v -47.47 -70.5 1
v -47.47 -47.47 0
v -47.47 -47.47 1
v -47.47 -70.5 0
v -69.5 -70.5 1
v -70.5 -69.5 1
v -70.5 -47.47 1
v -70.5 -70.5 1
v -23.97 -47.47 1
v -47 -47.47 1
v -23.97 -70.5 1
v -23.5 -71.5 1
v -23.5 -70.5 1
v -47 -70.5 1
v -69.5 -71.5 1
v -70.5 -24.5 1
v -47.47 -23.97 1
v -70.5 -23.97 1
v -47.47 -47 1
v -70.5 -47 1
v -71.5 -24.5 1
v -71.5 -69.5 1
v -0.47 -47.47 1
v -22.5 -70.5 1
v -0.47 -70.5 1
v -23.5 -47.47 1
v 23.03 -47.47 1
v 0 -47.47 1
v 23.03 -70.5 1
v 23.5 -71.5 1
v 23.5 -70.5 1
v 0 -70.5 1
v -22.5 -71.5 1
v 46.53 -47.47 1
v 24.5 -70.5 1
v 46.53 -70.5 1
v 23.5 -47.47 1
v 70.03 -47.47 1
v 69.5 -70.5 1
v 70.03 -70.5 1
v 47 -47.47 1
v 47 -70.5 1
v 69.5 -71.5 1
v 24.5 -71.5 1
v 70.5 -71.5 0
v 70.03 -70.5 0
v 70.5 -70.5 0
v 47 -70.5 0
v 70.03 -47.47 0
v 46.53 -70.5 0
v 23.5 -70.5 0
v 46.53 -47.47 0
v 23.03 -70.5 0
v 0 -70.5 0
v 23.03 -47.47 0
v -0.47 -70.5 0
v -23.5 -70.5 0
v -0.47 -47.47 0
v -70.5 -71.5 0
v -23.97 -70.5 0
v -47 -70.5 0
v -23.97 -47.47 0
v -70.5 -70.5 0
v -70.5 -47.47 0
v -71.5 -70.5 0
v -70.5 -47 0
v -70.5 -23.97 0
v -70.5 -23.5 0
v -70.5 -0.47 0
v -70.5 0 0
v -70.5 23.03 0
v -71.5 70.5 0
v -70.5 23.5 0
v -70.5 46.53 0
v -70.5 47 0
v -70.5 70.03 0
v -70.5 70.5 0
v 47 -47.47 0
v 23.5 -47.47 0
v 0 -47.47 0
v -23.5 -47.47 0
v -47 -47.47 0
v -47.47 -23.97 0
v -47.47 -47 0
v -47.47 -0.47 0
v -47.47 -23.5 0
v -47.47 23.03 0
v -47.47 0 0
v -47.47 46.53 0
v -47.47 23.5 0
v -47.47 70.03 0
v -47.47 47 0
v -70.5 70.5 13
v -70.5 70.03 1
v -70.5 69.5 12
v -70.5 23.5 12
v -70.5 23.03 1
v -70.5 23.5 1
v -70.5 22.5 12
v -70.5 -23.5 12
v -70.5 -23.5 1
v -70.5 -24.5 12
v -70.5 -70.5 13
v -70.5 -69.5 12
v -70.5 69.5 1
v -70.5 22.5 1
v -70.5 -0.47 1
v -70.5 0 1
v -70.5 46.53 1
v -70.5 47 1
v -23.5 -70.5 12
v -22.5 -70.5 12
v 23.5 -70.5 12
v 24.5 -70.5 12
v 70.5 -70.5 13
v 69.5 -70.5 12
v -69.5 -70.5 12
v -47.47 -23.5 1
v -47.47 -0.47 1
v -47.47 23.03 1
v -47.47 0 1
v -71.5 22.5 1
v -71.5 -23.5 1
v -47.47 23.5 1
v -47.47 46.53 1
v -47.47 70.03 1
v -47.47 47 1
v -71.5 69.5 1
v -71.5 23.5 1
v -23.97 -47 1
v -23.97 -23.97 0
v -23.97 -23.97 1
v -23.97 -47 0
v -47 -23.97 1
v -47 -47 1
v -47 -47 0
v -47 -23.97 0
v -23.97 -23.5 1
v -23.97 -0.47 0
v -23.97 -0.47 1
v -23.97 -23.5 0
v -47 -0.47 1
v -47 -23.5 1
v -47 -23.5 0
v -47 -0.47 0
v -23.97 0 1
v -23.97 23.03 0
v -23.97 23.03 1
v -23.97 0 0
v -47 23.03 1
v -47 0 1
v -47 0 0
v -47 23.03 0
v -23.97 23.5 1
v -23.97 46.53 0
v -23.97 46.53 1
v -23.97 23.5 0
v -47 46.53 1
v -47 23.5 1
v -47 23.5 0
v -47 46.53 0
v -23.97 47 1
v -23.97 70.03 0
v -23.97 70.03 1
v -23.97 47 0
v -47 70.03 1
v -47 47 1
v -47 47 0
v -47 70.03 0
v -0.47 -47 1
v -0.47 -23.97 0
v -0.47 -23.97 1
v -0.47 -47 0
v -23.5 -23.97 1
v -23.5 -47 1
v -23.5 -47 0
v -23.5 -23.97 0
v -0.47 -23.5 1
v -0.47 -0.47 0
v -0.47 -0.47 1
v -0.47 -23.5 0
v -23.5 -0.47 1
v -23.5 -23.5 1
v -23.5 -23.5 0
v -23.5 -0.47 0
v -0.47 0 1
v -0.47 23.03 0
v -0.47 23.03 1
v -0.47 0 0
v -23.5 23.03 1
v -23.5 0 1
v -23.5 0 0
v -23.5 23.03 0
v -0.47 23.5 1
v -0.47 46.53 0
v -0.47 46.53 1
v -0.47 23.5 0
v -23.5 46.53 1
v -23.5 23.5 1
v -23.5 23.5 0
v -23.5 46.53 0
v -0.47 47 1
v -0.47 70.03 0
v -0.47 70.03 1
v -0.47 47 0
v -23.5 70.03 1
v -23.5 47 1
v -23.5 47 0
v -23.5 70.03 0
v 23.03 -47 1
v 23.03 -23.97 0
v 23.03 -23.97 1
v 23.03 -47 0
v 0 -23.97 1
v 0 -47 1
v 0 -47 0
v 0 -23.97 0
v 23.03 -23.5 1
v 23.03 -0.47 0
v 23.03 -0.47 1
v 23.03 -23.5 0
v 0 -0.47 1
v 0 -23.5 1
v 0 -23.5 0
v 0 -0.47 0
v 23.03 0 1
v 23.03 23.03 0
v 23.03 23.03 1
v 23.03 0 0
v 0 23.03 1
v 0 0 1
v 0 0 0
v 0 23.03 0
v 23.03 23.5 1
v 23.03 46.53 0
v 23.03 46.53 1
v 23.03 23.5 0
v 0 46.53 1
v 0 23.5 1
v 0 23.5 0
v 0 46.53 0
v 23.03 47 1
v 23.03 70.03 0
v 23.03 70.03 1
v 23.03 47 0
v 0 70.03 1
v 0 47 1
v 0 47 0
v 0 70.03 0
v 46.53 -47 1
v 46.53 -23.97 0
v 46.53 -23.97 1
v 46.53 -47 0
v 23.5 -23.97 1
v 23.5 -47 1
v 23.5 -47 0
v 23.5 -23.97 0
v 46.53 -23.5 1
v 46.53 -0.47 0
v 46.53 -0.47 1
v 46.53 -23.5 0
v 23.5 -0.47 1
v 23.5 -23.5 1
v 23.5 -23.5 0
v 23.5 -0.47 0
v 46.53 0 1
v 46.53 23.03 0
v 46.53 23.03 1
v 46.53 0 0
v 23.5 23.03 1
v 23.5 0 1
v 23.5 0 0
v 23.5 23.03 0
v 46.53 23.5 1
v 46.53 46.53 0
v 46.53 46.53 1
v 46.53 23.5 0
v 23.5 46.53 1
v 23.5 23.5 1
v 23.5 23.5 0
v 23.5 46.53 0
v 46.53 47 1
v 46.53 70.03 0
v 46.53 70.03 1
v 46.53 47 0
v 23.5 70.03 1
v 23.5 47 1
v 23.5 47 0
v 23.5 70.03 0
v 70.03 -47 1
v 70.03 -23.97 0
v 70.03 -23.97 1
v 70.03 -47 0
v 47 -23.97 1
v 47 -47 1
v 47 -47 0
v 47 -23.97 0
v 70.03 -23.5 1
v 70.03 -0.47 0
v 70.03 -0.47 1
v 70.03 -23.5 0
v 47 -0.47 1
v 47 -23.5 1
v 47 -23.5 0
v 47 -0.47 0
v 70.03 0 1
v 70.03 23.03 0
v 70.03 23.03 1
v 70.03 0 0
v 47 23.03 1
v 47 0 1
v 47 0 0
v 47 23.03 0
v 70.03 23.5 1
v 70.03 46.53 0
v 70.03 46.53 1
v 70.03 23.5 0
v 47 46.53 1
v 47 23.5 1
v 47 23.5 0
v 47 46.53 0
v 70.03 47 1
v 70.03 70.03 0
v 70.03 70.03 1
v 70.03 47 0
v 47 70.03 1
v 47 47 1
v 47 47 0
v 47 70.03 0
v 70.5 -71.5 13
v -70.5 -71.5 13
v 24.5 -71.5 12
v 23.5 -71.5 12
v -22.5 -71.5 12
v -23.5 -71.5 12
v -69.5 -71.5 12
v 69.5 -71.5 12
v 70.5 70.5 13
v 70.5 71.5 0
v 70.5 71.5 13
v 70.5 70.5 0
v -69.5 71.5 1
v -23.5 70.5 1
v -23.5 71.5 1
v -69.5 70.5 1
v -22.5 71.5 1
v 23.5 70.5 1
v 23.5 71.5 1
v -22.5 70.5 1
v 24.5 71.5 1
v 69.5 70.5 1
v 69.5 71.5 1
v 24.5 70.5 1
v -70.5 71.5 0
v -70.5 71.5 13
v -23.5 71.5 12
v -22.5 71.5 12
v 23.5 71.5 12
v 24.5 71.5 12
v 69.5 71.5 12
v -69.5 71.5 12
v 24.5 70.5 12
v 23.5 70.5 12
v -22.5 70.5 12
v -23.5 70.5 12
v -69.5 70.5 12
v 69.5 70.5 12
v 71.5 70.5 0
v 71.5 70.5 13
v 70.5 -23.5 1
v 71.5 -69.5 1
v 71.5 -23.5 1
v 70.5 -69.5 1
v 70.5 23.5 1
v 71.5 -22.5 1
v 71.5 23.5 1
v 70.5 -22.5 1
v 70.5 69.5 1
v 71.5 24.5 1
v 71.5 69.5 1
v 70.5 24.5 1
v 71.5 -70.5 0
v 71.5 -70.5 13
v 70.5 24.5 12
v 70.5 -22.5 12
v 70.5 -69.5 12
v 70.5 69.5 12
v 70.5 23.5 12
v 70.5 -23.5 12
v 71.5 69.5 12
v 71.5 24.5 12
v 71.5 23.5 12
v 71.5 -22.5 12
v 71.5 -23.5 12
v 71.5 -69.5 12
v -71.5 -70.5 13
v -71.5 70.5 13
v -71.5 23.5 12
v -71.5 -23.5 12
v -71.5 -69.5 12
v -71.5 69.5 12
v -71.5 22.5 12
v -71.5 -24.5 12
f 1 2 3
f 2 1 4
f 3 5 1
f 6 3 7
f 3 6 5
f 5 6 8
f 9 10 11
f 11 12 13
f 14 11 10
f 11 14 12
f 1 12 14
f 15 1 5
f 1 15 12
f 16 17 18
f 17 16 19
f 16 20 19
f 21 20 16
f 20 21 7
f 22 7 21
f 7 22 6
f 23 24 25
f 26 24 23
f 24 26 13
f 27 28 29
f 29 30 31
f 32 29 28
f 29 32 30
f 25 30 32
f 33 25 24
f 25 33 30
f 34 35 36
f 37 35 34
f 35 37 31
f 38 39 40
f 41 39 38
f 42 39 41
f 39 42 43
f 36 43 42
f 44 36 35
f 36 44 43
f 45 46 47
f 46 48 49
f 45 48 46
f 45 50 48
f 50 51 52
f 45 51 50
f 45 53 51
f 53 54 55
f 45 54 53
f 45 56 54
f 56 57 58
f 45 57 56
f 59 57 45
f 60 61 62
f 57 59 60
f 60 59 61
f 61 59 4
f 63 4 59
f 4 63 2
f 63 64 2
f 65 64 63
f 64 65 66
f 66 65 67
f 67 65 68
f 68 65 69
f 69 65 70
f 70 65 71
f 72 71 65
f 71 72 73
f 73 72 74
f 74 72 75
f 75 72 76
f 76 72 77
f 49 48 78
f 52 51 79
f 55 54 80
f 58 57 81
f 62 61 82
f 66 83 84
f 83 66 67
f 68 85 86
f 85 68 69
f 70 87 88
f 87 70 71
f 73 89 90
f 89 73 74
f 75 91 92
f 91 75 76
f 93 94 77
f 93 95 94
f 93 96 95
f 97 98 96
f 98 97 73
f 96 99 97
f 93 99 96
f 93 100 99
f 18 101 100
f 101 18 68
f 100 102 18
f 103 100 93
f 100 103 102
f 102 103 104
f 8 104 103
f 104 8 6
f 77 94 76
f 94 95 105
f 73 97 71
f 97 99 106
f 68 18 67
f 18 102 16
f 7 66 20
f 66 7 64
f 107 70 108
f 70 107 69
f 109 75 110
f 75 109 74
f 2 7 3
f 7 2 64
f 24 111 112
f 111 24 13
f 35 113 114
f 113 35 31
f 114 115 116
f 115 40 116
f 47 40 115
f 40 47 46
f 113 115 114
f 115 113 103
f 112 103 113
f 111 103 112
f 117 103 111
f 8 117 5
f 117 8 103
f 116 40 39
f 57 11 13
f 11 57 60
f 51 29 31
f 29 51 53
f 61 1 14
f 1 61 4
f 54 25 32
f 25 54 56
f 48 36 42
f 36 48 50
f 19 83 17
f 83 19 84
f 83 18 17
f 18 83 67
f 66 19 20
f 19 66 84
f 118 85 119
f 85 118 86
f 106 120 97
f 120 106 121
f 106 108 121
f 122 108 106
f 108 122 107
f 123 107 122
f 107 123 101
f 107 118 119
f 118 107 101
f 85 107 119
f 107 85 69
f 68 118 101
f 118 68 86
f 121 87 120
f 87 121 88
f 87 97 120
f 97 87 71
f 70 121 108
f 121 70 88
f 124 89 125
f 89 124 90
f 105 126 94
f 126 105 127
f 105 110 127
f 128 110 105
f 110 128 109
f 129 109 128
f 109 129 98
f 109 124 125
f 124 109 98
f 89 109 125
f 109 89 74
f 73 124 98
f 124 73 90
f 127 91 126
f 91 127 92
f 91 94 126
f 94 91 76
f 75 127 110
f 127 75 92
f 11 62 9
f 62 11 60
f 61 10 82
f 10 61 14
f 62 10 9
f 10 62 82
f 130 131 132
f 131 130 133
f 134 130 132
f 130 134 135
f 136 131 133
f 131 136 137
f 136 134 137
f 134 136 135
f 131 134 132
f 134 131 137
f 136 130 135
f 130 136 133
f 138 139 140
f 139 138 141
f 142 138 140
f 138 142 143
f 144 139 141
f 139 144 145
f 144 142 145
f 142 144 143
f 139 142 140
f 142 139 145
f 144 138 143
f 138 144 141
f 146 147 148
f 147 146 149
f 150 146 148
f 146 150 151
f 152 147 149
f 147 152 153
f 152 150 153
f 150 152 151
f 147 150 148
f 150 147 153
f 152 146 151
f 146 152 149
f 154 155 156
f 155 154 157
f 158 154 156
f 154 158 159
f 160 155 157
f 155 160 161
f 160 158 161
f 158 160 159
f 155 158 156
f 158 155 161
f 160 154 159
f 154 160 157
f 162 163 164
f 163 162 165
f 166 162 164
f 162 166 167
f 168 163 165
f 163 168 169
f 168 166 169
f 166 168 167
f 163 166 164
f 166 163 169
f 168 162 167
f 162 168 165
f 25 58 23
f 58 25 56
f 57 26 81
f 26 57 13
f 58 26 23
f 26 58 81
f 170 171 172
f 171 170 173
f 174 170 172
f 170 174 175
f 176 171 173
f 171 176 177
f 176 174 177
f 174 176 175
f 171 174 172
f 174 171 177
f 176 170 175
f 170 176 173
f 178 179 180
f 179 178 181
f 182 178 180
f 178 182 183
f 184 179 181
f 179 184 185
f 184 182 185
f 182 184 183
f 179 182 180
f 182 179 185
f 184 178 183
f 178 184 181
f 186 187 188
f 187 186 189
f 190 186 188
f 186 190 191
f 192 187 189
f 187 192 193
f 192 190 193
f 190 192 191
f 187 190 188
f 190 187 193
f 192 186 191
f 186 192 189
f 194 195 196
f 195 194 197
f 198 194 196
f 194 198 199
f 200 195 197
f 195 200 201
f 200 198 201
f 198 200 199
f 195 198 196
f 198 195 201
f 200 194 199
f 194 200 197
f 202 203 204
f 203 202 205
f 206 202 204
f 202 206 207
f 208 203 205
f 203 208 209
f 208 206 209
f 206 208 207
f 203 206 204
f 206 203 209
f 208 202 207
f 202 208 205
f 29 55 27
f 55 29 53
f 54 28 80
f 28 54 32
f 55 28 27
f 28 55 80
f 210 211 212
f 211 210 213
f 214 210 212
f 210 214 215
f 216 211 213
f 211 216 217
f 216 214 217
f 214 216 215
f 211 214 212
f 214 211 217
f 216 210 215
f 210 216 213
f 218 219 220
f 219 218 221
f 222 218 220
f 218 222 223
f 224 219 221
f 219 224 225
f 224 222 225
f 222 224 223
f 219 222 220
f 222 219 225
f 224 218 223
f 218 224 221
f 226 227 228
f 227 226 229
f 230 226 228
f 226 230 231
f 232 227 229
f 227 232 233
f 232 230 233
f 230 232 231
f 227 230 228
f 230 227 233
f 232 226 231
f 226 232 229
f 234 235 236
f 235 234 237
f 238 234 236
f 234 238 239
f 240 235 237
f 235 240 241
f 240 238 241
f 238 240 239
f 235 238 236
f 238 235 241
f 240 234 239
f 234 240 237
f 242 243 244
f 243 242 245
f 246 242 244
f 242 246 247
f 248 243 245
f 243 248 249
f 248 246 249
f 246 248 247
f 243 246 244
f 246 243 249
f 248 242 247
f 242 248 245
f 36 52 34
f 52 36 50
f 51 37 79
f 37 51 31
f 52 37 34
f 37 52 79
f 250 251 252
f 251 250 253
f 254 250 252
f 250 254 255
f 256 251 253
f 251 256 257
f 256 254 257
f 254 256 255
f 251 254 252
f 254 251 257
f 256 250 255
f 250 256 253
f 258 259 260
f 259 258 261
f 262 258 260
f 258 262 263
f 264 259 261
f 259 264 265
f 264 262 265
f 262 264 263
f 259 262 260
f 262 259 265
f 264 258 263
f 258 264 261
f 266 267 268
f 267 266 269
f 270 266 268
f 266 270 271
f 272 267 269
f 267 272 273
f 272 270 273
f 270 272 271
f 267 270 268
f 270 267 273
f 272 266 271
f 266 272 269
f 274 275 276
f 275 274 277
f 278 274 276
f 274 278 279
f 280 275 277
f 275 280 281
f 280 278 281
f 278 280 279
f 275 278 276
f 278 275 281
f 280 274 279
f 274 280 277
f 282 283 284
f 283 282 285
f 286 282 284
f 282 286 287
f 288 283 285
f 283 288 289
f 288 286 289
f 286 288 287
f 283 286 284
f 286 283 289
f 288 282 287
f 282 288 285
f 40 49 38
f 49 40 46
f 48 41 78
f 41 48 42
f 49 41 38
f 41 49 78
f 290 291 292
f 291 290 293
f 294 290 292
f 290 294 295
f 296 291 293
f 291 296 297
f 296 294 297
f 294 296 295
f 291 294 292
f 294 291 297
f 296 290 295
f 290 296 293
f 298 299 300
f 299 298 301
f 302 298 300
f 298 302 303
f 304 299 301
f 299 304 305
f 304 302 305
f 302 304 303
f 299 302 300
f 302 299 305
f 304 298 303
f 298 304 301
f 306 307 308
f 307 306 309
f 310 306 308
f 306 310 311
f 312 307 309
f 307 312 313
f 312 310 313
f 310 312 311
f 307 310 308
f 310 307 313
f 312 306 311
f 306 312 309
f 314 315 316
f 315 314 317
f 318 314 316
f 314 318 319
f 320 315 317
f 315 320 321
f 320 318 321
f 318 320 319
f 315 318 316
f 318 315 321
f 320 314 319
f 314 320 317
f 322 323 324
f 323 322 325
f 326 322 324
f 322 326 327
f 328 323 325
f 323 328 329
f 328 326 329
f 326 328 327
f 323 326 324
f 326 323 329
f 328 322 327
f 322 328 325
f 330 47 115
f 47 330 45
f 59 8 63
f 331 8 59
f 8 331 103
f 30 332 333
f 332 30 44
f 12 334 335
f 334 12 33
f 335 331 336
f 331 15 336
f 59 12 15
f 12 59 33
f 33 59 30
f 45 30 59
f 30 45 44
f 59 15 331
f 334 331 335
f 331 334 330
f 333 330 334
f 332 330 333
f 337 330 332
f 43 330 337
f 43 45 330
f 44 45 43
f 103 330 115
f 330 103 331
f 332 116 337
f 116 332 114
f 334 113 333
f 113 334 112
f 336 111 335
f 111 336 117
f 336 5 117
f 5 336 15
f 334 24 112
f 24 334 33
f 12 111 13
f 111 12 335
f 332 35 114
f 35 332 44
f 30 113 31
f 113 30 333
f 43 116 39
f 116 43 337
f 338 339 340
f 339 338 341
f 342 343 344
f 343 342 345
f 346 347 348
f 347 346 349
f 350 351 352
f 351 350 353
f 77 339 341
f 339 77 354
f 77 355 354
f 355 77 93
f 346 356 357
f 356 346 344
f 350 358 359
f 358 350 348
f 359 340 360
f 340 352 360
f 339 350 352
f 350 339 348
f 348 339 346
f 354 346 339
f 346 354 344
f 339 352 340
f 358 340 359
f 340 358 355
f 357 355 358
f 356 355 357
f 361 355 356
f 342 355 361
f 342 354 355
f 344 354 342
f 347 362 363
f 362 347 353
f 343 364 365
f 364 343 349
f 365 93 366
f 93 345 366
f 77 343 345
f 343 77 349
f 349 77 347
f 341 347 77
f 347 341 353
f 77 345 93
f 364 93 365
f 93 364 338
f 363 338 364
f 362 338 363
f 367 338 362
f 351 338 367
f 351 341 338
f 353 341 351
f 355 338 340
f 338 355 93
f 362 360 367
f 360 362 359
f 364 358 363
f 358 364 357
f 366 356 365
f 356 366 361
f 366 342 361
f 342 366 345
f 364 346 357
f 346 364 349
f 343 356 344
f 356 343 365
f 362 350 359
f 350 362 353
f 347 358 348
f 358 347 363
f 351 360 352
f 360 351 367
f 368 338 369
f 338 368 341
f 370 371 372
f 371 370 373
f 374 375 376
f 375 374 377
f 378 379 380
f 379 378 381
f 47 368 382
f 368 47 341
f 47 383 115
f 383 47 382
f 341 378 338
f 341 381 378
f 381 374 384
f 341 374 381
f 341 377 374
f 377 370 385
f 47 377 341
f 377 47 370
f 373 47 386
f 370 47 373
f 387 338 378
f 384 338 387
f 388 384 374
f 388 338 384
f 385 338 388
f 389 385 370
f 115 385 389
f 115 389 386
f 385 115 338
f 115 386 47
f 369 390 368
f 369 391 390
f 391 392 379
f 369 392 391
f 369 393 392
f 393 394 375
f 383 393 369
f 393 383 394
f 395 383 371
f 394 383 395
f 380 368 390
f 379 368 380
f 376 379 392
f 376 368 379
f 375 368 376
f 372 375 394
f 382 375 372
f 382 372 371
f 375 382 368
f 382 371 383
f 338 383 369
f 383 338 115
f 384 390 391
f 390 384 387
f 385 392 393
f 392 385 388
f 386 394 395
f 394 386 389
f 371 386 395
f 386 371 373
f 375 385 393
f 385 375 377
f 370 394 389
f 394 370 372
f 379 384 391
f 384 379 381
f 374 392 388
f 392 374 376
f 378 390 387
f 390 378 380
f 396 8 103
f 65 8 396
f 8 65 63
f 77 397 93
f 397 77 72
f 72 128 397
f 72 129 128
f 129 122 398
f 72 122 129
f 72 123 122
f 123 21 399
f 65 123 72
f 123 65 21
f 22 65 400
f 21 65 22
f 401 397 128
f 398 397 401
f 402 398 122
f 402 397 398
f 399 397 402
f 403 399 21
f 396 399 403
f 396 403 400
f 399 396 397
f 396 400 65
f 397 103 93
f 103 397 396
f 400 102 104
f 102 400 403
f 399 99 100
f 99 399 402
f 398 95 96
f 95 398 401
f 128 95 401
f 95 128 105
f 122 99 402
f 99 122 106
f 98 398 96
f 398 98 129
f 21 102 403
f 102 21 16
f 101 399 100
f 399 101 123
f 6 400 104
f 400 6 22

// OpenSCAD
// file: Parameters.scad
// Parameters common to all FIRST robots

FIELD_WIDTH      = 141;  // inches
TILE_WIDTH       = FIELD_WIDTH/6;
//echo(TILE_WIDTH=TILE_WIDTH);
TILE_HEIGHT      = 1;
FIELD_SCALE      = .98;

TAPE_HEIGHT      = 0.01;

WALL_FRAME_WIDTH = 1;
WALL_HEIGHT      = 12;
// main file
include<Parameters.scad>

// Render an empty field

module tile() {
    color("grey") cube([TILE_WIDTH,TILE_WIDTH,TILE_HEIGHT],center=false);
}

module field_tiles() {
    for (i=[-3:1:2]) {
        for (j=[-3:1:2]) {
            translate([i*TILE_WIDTH,j*TILE_WIDTH,0])
                scale([FIELD_SCALE,FIELD_SCALE,1]) tile();
        }
    }
}

module field_wall() {

    WALL_COLOR = "black";

    color(WALL_COLOR) {
        translate([-FIELD_WIDTH/2,-FIELD_WIDTH/2-1,0]) 
            cube([FIELD_WIDTH,WALL_FRAME_WIDTH,WALL_FRAME_WIDTH],center=false);

        translate([-FIELD_WIDTH/2,-FIELD_WIDTH/2-1,WALL_HEIGHT]) 
            cube([FIELD_WIDTH,WALL_FRAME_WIDTH,WALL_FRAME_WIDTH],center=false);

        translate([-FIELD_WIDTH/2,-FIELD_WIDTH/2-1,0]) 
            cube([WALL_FRAME_WIDTH,WALL_FRAME_WIDTH,WALL_HEIGHT],center=false);

        translate([-FIELD_WIDTH/6,-FIELD_WIDTH/2-1,0]) 
            cube([WALL_FRAME_WIDTH,WALL_FRAME_WIDTH,WALL_HEIGHT],center=false);

        translate([FIELD_WIDTH/6,-FIELD_WIDTH/2-1,0]) 
            cube([WALL_FRAME_WIDTH,WALL_FRAME_WIDTH,WALL_HEIGHT],center=false);

        translate([FIELD_WIDTH/2-WALL_FRAME_WIDTH,-FIELD_WIDTH/2-1,0]) 
            cube([WALL_FRAME_WIDTH,WALL_FRAME_WIDTH,WALL_HEIGHT],center=false);
        }
}

module labelWalls() {
    fontSize = 2;
    baseLevel = 5;
    
    color("orange") {
        translate([FIELD_WIDTH/2-10,-FIELD_WIDTH/2+15,baseLevel]) 
            scale([FIELD_SCALE,FIELD_SCALE,1]) rotate([180,180,-270]) text("144,144", size=fontSize);
        translate([-FIELD_WIDTH/2+5,FIELD_WIDTH/2-5,5]) 
            scale([FIELD_SCALE,FIELD_SCALE,1]) rotate([180,180,-270]) text("0,0", size=fontSize);
        translate([FIELD_WIDTH/2-10,FIELD_WIDTH/2-10,baseLevel]) 
            scale([FIELD_SCALE,FIELD_SCALE,1]) rotate([180,180,-270]) text("0,144", size=fontSize);
        translate([-FIELD_WIDTH/2+10,-FIELD_WIDTH/2+15,baseLevel]) 
            scale([FIELD_SCALE,FIELD_SCALE,1]) rotate([180,180,-270]) text("144,0", size=fontSize);
    }
}

module BuildField() {

    field_tiles();

    field_wall();

    translate( [0, FIELD_WIDTH+WALL_FRAME_WIDTH, 0]) field_wall();

    translate( [0, 0, 0])  rotate([0, 0, 90]) field_wall();
    
    translate( [0, 0, 0])  rotate([0, 0, -90]) field_wall();

    labelWalls();
}

BuildField();
translate([70.5,70.5,0]) circle(r=2,$fn=20);  // size check
translate([-70.5,-70.5,0]) circle(r=2,$fn=20);  // size check
